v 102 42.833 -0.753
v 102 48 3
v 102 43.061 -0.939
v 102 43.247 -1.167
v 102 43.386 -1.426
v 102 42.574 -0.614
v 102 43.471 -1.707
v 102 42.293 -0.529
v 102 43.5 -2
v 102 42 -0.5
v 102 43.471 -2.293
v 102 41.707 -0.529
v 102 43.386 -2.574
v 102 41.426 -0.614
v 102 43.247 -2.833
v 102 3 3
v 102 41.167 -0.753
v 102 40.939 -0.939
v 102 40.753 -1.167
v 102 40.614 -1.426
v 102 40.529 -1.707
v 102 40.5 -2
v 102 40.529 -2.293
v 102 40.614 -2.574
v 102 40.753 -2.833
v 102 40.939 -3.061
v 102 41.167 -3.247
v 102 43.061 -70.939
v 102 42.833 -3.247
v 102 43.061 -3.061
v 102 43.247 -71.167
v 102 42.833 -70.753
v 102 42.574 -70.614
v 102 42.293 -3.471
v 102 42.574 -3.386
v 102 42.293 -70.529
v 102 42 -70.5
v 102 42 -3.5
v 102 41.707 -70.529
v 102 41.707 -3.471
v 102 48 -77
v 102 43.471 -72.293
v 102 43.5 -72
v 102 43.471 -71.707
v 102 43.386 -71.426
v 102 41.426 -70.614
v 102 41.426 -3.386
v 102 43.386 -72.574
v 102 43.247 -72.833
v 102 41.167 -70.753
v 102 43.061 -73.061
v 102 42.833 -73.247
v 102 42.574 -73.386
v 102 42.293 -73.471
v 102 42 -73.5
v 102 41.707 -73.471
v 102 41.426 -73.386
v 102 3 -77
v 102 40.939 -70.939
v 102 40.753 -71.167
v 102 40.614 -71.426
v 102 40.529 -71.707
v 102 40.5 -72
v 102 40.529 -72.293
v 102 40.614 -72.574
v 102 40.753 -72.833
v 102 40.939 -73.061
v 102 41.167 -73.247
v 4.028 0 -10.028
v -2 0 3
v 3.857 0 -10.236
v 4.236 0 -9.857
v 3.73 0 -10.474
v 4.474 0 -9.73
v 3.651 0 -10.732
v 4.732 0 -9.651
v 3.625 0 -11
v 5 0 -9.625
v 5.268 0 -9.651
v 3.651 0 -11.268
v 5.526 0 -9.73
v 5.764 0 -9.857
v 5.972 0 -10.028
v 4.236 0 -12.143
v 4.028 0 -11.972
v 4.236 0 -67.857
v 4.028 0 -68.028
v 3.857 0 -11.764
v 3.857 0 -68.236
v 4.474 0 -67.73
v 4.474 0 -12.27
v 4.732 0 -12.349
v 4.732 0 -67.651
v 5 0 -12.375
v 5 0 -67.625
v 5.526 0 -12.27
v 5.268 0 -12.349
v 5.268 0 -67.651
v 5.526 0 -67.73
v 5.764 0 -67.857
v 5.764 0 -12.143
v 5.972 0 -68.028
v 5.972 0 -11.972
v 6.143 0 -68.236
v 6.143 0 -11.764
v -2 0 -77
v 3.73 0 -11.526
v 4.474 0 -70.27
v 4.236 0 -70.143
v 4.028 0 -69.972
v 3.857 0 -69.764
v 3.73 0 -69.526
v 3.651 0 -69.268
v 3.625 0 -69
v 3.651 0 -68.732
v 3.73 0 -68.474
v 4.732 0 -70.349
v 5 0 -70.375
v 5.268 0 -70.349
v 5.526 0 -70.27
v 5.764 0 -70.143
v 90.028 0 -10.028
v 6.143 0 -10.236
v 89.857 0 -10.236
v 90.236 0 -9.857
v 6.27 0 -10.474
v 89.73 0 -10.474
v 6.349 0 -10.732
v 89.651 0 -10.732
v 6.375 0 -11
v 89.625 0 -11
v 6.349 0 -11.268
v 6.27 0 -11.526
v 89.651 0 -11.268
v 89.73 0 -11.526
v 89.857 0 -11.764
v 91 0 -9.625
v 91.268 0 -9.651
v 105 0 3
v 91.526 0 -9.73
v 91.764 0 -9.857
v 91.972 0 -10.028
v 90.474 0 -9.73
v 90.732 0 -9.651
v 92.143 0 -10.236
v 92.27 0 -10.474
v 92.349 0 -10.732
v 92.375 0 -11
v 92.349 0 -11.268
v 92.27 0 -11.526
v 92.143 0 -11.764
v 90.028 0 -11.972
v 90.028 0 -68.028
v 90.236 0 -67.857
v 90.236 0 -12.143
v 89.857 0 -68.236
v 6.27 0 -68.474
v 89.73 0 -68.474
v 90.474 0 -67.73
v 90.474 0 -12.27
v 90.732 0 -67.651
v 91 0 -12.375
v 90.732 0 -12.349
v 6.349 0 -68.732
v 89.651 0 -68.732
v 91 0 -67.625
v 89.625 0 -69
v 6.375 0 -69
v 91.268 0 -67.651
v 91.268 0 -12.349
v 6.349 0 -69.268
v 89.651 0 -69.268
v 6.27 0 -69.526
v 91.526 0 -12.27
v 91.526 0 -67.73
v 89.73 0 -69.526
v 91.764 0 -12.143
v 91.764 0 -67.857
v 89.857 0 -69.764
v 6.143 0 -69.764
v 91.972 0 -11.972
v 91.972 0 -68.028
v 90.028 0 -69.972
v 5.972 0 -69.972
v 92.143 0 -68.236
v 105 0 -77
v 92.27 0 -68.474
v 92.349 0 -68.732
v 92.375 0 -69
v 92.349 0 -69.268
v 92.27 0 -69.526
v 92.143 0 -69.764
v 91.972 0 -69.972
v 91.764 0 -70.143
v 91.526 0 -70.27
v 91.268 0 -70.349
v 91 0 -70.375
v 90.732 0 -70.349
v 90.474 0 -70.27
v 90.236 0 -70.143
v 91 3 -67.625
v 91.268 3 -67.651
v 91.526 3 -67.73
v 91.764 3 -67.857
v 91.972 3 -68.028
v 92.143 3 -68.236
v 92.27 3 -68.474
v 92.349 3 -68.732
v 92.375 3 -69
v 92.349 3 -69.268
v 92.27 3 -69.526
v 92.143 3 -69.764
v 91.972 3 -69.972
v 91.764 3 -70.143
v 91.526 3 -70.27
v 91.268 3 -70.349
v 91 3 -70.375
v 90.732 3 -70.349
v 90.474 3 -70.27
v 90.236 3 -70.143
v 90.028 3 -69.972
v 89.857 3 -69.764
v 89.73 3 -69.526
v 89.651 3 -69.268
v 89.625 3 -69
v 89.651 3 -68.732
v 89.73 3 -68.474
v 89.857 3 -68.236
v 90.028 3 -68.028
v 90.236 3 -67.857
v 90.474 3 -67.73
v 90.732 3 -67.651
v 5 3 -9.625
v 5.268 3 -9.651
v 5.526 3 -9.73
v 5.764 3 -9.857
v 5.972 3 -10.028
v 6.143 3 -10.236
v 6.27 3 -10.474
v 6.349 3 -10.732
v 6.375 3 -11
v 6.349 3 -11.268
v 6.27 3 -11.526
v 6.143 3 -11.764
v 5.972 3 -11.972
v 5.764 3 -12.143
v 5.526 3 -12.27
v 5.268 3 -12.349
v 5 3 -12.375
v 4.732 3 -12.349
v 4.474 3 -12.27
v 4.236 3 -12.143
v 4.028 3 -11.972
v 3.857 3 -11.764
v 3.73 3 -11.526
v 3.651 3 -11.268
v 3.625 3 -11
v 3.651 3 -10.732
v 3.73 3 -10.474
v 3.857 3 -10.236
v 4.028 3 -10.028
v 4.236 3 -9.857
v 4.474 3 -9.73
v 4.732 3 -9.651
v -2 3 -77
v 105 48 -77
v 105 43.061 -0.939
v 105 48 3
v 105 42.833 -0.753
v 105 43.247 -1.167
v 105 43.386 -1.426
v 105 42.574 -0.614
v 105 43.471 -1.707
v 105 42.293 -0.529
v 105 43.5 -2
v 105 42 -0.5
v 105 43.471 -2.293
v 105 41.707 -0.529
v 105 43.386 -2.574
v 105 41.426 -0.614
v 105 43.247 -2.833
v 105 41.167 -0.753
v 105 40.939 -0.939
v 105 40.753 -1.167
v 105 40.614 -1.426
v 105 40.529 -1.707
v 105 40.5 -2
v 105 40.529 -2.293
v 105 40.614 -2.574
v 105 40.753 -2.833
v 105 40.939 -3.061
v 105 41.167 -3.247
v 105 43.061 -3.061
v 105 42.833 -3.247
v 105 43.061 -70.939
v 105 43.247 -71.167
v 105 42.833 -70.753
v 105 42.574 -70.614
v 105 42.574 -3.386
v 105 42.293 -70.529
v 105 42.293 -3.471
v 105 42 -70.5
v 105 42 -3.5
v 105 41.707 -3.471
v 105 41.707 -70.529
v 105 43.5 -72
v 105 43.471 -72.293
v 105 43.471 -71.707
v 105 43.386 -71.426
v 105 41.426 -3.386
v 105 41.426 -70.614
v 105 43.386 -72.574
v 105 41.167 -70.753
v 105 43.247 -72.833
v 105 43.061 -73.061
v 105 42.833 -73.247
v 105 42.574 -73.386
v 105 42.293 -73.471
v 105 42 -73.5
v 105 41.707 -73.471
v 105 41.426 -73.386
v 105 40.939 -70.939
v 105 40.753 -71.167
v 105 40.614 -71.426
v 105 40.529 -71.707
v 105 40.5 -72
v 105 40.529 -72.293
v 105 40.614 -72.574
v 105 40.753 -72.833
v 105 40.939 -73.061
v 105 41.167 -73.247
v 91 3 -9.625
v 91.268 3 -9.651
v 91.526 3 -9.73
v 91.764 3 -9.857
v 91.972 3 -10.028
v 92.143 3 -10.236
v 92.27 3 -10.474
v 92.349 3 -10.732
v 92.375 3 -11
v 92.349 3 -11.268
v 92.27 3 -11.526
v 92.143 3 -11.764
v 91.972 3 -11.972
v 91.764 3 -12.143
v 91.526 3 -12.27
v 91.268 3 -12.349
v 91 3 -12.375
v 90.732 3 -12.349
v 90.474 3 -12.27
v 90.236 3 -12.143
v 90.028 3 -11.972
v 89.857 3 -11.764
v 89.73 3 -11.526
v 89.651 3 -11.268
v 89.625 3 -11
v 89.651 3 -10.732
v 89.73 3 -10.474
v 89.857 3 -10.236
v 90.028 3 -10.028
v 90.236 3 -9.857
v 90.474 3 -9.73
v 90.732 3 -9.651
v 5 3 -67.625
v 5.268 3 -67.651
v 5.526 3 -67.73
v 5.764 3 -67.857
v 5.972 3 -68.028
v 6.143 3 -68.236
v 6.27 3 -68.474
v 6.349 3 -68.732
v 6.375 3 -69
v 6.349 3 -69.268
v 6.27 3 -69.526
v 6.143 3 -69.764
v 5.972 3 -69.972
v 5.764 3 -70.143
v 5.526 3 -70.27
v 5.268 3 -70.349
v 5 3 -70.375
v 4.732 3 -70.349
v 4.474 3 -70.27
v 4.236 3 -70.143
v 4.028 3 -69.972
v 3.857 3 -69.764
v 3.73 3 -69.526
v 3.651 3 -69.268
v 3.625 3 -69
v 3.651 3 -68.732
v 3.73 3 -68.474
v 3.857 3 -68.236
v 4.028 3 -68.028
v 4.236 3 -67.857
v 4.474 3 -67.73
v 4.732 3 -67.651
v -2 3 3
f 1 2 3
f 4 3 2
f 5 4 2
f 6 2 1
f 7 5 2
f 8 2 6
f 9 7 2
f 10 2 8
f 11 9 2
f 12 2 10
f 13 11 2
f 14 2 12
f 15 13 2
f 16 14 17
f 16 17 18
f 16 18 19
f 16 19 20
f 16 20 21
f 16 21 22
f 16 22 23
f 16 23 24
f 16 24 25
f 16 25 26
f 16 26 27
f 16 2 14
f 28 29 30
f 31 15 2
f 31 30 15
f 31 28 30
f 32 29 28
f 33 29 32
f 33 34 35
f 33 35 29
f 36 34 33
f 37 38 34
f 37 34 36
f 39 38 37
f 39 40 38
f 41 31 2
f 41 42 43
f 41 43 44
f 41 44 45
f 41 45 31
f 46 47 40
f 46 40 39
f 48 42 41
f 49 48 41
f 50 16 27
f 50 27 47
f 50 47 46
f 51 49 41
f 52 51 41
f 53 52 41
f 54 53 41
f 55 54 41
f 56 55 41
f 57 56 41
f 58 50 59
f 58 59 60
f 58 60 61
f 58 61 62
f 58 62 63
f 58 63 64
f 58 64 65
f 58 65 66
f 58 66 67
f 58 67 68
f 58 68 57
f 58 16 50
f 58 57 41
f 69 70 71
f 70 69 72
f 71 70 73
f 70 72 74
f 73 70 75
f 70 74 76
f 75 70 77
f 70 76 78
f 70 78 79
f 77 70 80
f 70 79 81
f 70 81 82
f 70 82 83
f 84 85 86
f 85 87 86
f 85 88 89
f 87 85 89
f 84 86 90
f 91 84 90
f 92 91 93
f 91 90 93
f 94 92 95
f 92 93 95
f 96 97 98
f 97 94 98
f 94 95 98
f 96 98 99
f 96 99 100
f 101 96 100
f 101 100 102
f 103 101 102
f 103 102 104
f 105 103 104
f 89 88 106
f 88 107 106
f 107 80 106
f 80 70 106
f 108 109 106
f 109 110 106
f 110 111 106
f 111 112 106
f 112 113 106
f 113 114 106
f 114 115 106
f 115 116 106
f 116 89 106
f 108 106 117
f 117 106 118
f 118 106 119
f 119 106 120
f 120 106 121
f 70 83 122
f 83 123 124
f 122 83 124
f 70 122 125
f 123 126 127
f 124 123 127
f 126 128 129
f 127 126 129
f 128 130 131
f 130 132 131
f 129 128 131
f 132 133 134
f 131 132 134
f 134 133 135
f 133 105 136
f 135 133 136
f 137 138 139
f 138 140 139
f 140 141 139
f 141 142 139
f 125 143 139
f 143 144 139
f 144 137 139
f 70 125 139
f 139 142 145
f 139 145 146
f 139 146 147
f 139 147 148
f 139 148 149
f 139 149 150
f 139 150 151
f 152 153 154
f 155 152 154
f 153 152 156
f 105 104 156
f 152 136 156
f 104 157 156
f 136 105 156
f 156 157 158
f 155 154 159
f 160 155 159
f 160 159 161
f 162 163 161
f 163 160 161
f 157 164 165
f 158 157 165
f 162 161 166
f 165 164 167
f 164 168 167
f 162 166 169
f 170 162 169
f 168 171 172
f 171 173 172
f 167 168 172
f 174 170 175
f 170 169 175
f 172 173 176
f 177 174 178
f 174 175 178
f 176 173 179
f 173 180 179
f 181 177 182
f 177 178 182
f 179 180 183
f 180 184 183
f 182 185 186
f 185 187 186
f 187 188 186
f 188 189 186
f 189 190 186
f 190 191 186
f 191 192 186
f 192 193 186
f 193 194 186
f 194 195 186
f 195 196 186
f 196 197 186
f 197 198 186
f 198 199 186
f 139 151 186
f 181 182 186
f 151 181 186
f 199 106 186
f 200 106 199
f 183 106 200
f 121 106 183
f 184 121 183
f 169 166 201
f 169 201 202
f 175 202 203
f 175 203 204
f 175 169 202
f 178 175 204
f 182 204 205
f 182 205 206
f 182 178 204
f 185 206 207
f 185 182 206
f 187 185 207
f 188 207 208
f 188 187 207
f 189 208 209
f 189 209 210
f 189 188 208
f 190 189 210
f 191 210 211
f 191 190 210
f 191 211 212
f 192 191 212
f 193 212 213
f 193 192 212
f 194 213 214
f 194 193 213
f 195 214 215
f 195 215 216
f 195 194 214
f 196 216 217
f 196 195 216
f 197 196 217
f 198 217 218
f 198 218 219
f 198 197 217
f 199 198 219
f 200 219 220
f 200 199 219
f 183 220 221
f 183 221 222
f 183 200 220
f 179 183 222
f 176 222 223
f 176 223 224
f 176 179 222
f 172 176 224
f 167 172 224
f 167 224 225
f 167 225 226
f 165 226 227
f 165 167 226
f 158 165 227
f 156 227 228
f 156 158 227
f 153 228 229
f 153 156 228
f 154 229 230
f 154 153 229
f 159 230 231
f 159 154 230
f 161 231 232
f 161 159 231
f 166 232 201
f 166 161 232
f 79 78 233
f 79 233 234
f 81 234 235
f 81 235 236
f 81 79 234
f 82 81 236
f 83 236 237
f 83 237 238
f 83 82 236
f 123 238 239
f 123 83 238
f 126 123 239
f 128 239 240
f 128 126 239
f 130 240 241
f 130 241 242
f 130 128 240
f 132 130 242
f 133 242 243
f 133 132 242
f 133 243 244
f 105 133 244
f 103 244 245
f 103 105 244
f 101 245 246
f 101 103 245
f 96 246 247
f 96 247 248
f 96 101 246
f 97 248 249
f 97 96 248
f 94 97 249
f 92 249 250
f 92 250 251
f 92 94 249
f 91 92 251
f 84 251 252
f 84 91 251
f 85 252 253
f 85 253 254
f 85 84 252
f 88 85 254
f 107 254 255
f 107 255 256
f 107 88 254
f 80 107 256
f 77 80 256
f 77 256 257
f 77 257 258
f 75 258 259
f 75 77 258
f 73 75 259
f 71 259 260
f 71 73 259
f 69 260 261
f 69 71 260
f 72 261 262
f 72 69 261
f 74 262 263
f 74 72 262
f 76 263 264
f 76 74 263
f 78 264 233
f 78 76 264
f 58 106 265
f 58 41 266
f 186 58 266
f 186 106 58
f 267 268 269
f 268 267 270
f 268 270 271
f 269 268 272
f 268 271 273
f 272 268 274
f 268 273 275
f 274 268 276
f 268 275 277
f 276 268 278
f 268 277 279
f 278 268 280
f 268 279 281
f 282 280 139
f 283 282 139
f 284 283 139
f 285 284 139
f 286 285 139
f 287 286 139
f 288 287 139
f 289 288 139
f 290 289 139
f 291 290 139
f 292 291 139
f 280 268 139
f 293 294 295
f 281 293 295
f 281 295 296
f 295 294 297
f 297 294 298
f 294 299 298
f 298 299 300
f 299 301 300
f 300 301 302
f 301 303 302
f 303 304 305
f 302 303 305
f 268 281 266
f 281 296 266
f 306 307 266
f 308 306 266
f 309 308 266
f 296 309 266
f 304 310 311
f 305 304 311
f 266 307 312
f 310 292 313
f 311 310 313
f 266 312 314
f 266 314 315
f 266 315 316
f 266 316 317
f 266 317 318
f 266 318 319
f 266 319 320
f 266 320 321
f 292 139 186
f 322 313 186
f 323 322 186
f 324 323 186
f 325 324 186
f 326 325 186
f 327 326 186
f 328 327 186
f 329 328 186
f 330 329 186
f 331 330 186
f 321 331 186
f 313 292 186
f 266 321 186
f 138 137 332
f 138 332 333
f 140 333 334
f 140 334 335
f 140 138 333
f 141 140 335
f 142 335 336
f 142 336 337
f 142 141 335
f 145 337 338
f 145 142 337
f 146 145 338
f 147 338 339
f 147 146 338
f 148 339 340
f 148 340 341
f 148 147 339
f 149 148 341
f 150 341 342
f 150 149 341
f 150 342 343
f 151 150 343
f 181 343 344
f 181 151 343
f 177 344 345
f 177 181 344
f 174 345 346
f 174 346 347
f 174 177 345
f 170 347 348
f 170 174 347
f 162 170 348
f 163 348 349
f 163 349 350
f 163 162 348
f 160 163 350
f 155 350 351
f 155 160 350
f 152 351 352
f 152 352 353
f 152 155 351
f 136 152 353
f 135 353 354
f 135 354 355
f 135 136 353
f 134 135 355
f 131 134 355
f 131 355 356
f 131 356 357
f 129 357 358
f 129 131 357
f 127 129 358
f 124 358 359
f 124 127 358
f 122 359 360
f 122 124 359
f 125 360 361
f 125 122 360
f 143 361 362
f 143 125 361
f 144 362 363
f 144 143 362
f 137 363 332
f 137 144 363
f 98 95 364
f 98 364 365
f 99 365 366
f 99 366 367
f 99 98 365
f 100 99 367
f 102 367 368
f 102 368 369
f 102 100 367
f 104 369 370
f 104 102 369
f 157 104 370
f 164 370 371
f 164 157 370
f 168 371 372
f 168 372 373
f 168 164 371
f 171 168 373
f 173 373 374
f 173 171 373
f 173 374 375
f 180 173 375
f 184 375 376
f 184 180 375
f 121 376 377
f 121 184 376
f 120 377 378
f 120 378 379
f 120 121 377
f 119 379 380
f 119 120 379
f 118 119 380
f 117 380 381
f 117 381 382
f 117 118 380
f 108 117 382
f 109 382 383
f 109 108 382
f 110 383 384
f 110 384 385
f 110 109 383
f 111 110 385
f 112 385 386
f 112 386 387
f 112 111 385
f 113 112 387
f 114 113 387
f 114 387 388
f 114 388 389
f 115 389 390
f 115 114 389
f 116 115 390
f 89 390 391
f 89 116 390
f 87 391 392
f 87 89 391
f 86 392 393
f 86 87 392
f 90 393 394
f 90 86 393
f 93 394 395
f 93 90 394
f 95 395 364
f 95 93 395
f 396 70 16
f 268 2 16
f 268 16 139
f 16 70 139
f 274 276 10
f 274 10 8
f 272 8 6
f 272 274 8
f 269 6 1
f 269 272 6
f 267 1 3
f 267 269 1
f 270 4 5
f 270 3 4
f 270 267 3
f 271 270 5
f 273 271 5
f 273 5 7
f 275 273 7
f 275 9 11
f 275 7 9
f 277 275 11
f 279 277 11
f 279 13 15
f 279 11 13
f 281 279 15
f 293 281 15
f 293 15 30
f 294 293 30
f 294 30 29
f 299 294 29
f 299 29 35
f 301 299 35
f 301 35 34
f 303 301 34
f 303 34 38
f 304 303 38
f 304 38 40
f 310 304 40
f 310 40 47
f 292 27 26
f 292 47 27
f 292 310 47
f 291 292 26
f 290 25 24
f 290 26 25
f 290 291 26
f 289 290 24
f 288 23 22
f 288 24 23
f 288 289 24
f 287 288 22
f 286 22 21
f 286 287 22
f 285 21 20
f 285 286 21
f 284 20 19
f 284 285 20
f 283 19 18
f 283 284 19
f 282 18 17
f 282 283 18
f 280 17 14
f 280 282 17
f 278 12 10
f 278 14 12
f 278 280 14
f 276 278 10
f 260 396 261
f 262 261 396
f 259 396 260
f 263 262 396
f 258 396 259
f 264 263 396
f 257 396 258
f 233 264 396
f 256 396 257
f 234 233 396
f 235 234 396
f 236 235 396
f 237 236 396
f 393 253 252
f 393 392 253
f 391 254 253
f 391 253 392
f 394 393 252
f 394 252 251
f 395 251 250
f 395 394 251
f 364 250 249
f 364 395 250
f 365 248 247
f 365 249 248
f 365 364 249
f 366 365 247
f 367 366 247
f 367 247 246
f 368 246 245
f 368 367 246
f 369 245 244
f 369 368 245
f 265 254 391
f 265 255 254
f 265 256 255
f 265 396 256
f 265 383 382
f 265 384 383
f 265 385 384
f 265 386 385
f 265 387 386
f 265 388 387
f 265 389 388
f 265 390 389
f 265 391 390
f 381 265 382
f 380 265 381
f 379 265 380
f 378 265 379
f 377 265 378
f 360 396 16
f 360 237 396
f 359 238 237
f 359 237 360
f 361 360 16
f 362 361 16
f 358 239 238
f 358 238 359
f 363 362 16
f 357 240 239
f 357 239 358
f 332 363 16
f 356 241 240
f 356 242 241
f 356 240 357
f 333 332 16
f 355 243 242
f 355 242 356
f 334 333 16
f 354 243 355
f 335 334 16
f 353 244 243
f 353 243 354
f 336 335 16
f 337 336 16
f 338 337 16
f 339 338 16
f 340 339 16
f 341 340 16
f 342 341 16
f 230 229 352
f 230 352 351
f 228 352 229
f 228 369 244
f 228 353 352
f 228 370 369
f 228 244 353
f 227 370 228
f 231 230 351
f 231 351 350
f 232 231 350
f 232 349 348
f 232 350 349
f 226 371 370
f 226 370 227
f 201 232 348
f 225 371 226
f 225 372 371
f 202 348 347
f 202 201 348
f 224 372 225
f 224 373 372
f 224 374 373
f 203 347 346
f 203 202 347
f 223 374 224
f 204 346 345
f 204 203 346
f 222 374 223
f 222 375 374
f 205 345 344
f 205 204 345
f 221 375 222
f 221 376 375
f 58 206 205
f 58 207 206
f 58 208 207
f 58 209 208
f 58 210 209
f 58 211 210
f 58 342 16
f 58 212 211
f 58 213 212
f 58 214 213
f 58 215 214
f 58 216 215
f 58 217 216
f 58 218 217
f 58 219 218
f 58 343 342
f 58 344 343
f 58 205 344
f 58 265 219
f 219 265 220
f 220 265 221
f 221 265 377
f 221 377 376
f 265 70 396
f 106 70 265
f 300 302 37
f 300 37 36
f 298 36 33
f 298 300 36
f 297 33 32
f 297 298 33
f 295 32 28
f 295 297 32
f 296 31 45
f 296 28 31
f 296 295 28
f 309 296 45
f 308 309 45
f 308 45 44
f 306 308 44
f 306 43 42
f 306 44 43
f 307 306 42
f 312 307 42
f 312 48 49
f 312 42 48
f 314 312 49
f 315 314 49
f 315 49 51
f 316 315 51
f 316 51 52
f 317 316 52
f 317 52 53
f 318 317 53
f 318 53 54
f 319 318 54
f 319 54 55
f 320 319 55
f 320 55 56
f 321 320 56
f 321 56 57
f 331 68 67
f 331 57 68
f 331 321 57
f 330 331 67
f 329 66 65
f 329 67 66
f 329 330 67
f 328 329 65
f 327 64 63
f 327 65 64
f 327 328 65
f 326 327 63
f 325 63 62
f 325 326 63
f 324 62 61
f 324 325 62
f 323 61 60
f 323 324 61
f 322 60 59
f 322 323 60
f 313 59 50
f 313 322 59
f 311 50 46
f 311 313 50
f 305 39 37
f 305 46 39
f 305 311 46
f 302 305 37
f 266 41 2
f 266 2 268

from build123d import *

# Parameters (mm, degrees)
SKETCH1_W               = 110
SKETCH1_H               = 80
SKETCH1_R               = 1.375
BOSS_EXTRUDE1_DEPTH     = 3
SKETCH3_W               = 3
SKETCH3_H               = 80
BOSS_EXTRUDE2_DEPTH     = 45
CUT_EXTRUDE1_DEPTH      = 141.292551477
CUT_EXTRUDE1_DEPTH_BACK = 141.292551477
SKETCH4_R               = 1.5
CUT_EXTRUDE2_DEPTH      = 138.764291455
CUT_EXTRUDE2_DEPTH_BACK = 138.764291455
SKETCH5_W               = 3
SKETCH5_H               = 80


with BuildPart() as part:
    # Sketch1 → Boss-Extrude1 (new body)
    with BuildSketch(Plane(origin=(0, 0, 0), x_dir=(1, 0, 0), z_dir=(0, 1, 0))):
        with Locations((50, 37)):
            Rectangle(SKETCH1_W, SKETCH1_H)
        with Locations(Location((5, 11, 0), (0, 0, 270))):
            Circle(SKETCH1_R, mode=Mode.SUBTRACT)
        with Locations(Location((5, 69, 0), (0, 0, 270))):
            Circle(SKETCH1_R, mode=Mode.SUBTRACT)
        with Locations(Location((91, 69, 0), (0, 0, 270))):
            Circle(SKETCH1_R, mode=Mode.SUBTRACT)
        with Locations(Location((91, 11, 0), (0, 0, 270))):
            Circle(SKETCH1_R, mode=Mode.SUBTRACT)
    extrude(amount=BOSS_EXTRUDE1_DEPTH)

    # Sketch3 → Boss-Extrude2 (add)
    with BuildSketch(Plane(origin=(0, 3, 0), x_dir=(1, 0, 0), z_dir=(0, 1, 0))):
        with Locations((-3.5, 37)):
            Rectangle(SKETCH3_W, SKETCH3_H)
        with Locations((103.5, 37)):
            Rectangle(SKETCH3_W, SKETCH3_H)
    extrude(amount=BOSS_EXTRUDE2_DEPTH)

    # Sketch4 → Cut-Extrude1 (cut, two sides: drawn at the far end of the back side and taken through both)
    with BuildSketch(Plane.ZY.offset(-102).offset(-CUT_EXTRUDE1_DEPTH_BACK)):
        with Locations((-72, 42)):
            Circle(SKETCH4_R)
        with Locations((-2, 42)):
            Circle(SKETCH4_R)
    extrude(amount=CUT_EXTRUDE1_DEPTH + CUT_EXTRUDE1_DEPTH_BACK, mode=Mode.SUBTRACT)

    # Sketch5 → Cut-Extrude2 (cut, two sides: drawn at the far end of the back side and taken through both)
    with BuildSketch(Plane(origin=(0, 3, 0), x_dir=(1, 0, 0), z_dir=(0, 1, 0)).offset(-CUT_EXTRUDE2_DEPTH_BACK)):
        with Locations((-3.5, 37)):
            Rectangle(SKETCH5_W, SKETCH5_H)
    extrude(amount=CUT_EXTRUDE2_DEPTH + CUT_EXTRUDE2_DEPTH_BACK, mode=Mode.SUBTRACT)


solid = part.part
